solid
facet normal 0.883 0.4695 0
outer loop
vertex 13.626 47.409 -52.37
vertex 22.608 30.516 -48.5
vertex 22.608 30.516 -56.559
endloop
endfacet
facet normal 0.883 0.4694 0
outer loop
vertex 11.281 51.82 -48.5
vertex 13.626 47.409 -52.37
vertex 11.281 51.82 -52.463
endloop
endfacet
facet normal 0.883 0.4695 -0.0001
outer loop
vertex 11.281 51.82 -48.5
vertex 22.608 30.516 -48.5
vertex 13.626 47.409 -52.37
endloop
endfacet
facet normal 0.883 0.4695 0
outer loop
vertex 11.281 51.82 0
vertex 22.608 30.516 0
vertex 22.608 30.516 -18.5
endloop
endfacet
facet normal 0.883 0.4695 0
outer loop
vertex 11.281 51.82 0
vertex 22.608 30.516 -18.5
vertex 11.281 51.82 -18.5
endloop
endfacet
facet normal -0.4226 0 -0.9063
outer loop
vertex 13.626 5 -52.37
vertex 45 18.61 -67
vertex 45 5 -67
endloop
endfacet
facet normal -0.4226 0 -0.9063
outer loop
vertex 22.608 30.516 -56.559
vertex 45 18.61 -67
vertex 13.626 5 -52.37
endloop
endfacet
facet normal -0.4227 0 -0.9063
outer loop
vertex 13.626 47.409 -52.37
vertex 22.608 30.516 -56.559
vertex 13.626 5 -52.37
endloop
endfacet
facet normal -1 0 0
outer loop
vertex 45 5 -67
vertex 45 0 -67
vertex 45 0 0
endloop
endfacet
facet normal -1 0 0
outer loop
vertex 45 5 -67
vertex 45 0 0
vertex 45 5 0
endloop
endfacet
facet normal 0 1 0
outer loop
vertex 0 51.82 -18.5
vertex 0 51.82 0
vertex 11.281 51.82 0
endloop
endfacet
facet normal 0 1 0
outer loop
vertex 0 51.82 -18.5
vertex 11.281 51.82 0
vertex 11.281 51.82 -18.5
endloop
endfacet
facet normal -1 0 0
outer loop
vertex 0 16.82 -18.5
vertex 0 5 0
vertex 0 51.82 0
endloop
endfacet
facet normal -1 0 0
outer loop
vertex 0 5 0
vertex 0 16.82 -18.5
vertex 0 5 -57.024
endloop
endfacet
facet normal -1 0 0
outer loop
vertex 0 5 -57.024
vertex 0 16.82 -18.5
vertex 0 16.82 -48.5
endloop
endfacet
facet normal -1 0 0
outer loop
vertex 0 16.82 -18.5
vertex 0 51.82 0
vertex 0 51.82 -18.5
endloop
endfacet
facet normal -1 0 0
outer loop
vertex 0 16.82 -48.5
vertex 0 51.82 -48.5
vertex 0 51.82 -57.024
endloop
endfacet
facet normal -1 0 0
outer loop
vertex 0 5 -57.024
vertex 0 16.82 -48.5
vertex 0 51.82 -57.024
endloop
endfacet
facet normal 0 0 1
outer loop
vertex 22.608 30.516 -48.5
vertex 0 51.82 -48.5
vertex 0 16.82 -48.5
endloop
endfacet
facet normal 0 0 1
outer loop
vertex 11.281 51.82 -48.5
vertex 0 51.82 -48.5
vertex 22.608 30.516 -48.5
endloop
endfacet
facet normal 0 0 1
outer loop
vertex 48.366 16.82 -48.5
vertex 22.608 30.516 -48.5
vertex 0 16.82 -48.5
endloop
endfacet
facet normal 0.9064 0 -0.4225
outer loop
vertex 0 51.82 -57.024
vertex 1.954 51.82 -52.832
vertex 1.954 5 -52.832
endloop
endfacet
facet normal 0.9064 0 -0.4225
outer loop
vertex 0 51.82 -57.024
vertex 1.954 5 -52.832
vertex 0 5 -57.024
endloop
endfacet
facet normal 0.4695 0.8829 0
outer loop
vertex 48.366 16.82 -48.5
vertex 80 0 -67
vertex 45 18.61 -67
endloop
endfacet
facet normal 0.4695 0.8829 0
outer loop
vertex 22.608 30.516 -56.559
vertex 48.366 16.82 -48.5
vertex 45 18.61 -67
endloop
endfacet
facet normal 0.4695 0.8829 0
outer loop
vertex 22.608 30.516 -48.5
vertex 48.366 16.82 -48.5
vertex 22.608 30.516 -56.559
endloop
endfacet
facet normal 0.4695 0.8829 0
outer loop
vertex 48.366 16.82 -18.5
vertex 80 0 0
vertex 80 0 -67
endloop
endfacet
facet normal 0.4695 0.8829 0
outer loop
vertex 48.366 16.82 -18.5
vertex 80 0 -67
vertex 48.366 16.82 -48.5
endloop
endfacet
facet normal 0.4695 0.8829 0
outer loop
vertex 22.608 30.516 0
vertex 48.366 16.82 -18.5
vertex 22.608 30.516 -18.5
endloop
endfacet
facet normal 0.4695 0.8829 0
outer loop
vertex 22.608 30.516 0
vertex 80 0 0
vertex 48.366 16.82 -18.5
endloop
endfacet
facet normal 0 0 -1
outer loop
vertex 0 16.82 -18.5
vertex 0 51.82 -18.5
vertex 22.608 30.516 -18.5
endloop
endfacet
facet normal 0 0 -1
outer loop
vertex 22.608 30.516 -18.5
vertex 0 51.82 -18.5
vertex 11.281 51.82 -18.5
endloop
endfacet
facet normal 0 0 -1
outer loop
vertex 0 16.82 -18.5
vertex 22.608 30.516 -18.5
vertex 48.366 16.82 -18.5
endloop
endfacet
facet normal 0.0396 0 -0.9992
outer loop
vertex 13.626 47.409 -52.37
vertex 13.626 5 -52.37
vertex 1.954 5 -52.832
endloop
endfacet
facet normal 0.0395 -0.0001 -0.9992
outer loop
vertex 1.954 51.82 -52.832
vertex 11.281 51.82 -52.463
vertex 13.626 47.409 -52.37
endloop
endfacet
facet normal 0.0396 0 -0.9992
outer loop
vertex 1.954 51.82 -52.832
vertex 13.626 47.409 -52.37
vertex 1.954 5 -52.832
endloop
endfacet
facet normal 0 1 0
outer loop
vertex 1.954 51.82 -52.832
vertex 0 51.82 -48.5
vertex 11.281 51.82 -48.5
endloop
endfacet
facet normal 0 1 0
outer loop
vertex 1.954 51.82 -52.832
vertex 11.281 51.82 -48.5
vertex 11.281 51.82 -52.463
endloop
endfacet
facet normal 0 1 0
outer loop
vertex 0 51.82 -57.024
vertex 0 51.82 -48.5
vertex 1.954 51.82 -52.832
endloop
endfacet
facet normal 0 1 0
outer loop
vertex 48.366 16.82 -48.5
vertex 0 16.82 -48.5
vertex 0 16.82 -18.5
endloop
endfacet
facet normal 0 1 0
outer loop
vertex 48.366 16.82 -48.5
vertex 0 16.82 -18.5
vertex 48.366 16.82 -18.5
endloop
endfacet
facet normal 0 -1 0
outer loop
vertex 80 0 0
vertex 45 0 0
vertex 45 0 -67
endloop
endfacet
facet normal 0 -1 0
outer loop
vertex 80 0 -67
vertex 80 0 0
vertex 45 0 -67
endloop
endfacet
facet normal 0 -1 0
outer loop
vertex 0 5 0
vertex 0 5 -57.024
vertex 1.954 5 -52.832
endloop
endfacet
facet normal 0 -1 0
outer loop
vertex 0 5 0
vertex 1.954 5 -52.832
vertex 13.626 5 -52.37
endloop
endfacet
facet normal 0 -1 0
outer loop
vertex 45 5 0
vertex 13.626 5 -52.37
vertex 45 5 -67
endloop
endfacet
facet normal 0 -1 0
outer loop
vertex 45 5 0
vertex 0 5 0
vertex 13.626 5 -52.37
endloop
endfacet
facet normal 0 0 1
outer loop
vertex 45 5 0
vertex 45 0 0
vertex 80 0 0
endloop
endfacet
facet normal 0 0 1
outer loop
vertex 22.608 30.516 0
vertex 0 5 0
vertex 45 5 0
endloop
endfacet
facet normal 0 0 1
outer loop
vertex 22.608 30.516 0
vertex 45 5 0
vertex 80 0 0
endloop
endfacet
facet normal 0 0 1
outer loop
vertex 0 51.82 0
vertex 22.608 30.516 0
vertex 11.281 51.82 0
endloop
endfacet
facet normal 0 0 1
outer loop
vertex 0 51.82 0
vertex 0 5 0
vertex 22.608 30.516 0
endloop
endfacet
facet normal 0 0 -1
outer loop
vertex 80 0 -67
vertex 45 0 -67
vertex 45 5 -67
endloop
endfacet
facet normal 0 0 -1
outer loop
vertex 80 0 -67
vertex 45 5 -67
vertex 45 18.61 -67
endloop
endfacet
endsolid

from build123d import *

# Parameters (mm, degrees)
CROQUIS1_W              = 67
CROQUIS1_H              = 51.82
SALIENTE_EXTRUIR1_DEPTH = 80
CORTAR_EXTRUIR1_REACH   = 69
CROQUIS4_W              = 60
CROQUIS4_H              = 30
CORTAR_EXTRUIR2_DEPTH   = 35
CORTAR_EXTRUIR3_REACH   = 69
CROQUIS5_W              = 45
CROQUIS5_H              = 5
CORTAR_EXTRUIR4_REACH   = 53.82
CORTAR_EXTRUIR5_REACH   = 53.82


with BuildPart() as part:
    # Croquis1 → Saliente-Extruir1 (new body)
    with BuildSketch(Plane(origin=(0, 0, 0), x_dir=(0, 0, -1), z_dir=(1, 0, 0))):
        with Locations((33.5, 25.91)):
            Rectangle(CROQUIS1_W, CROQUIS1_H)
    extrude(amount=SALIENTE_EXTRUIR1_DEPTH)

    # Croquis3 → Cortar-Extruir1 (cut, up to next)
    with BuildSketch(Plane.XY, mode=Mode.PRIVATE) as cortar_extruir1_sk1:
        Polygon((80, 0), (22.608406464, 30.515651581), (11.280683474, 51.82), (80, 51.82), align=None)
    cortar_extruir1_tool1 = extrude(cortar_extruir1_sk1.sketch, amount=-CORTAR_EXTRUIR1_REACH, mode=Mode.PRIVATE) & part.part
    add(cortar_extruir1_tool1.solids().sort_by_distance((53.313116, 33.143327, 0))[0], mode=Mode.SUBTRACT)

    # Croquis4 → Cortar-Extruir2 (cut)
    with BuildSketch(Plane(origin=(0, 51.82, 0), x_dir=(1, 0, 0), z_dir=(0, 1, 0))):
        with Locations((30, 33.5)):
            Rectangle(CROQUIS4_W, CROQUIS4_H)
    extrude(amount=-CORTAR_EXTRUIR2_DEPTH, mode=Mode.SUBTRACT)

    # Croquis5 → Cortar-Extruir3 (cut, up to next)
    with BuildSketch(Plane.XY, mode=Mode.PRIVATE) as cortar_extruir3_sk1:
        with Locations((22.5, 2.5)):
            Rectangle(CROQUIS5_W, CROQUIS5_H)
    cortar_extruir3_tool1 = extrude(cortar_extruir3_sk1.sketch, amount=-CORTAR_EXTRUIR3_REACH, mode=Mode.PRIVATE) & part.part
    add(cortar_extruir3_tool1.solids().sort_by_distance((22.5, 2.5, 0))[0], mode=Mode.SUBTRACT)

    # Croquis6 → Cortar-Extruir4 (cut, up to next)
    with BuildSketch(Plane(origin=(0, 51.82, 0), x_dir=(1, 0, 0), z_dir=(0, 1, 0)), mode=Mode.PRIVATE) as cortar_extruir4_sk1:
        Polygon((4.922856145, 67), (0, 64.334655313), (0, 67), align=None)
    cortar_extruir4_tool1 = extrude(cortar_extruir4_sk1.sketch, amount=-CORTAR_EXTRUIR4_REACH, mode=Mode.PRIVATE) & part.part
    add(cortar_extruir4_tool1.solids().sort_by_distance((1.640952, 51.82, -66.111552))[0], mode=Mode.SUBTRACT)

    # Croquis9 → Cortar-Extruir5 (cut, up to next)
    with BuildSketch(Plane(origin=(0, 51.82, 0), x_dir=(1, 0, 0), z_dir=(0, 1, 0)), mode=Mode.PRIVATE) as cortar_extruir5_sk1:
        Polygon((45, 67), (13.626202653, 52.370158031), (1.954435626, 52.832439456), (-4.658833913, 67.014641749), align=None)
    cortar_extruir5_tool1 = extrude(cortar_extruir5_sk1.sketch, amount=-CORTAR_EXTRUIR5_REACH, mode=Mode.PRIVATE) & part.part
    add(cortar_extruir5_tool1.solids().sort_by_distance((15.368059, 51.82, -61.265598))[0], mode=Mode.SUBTRACT)


solid = part.part
